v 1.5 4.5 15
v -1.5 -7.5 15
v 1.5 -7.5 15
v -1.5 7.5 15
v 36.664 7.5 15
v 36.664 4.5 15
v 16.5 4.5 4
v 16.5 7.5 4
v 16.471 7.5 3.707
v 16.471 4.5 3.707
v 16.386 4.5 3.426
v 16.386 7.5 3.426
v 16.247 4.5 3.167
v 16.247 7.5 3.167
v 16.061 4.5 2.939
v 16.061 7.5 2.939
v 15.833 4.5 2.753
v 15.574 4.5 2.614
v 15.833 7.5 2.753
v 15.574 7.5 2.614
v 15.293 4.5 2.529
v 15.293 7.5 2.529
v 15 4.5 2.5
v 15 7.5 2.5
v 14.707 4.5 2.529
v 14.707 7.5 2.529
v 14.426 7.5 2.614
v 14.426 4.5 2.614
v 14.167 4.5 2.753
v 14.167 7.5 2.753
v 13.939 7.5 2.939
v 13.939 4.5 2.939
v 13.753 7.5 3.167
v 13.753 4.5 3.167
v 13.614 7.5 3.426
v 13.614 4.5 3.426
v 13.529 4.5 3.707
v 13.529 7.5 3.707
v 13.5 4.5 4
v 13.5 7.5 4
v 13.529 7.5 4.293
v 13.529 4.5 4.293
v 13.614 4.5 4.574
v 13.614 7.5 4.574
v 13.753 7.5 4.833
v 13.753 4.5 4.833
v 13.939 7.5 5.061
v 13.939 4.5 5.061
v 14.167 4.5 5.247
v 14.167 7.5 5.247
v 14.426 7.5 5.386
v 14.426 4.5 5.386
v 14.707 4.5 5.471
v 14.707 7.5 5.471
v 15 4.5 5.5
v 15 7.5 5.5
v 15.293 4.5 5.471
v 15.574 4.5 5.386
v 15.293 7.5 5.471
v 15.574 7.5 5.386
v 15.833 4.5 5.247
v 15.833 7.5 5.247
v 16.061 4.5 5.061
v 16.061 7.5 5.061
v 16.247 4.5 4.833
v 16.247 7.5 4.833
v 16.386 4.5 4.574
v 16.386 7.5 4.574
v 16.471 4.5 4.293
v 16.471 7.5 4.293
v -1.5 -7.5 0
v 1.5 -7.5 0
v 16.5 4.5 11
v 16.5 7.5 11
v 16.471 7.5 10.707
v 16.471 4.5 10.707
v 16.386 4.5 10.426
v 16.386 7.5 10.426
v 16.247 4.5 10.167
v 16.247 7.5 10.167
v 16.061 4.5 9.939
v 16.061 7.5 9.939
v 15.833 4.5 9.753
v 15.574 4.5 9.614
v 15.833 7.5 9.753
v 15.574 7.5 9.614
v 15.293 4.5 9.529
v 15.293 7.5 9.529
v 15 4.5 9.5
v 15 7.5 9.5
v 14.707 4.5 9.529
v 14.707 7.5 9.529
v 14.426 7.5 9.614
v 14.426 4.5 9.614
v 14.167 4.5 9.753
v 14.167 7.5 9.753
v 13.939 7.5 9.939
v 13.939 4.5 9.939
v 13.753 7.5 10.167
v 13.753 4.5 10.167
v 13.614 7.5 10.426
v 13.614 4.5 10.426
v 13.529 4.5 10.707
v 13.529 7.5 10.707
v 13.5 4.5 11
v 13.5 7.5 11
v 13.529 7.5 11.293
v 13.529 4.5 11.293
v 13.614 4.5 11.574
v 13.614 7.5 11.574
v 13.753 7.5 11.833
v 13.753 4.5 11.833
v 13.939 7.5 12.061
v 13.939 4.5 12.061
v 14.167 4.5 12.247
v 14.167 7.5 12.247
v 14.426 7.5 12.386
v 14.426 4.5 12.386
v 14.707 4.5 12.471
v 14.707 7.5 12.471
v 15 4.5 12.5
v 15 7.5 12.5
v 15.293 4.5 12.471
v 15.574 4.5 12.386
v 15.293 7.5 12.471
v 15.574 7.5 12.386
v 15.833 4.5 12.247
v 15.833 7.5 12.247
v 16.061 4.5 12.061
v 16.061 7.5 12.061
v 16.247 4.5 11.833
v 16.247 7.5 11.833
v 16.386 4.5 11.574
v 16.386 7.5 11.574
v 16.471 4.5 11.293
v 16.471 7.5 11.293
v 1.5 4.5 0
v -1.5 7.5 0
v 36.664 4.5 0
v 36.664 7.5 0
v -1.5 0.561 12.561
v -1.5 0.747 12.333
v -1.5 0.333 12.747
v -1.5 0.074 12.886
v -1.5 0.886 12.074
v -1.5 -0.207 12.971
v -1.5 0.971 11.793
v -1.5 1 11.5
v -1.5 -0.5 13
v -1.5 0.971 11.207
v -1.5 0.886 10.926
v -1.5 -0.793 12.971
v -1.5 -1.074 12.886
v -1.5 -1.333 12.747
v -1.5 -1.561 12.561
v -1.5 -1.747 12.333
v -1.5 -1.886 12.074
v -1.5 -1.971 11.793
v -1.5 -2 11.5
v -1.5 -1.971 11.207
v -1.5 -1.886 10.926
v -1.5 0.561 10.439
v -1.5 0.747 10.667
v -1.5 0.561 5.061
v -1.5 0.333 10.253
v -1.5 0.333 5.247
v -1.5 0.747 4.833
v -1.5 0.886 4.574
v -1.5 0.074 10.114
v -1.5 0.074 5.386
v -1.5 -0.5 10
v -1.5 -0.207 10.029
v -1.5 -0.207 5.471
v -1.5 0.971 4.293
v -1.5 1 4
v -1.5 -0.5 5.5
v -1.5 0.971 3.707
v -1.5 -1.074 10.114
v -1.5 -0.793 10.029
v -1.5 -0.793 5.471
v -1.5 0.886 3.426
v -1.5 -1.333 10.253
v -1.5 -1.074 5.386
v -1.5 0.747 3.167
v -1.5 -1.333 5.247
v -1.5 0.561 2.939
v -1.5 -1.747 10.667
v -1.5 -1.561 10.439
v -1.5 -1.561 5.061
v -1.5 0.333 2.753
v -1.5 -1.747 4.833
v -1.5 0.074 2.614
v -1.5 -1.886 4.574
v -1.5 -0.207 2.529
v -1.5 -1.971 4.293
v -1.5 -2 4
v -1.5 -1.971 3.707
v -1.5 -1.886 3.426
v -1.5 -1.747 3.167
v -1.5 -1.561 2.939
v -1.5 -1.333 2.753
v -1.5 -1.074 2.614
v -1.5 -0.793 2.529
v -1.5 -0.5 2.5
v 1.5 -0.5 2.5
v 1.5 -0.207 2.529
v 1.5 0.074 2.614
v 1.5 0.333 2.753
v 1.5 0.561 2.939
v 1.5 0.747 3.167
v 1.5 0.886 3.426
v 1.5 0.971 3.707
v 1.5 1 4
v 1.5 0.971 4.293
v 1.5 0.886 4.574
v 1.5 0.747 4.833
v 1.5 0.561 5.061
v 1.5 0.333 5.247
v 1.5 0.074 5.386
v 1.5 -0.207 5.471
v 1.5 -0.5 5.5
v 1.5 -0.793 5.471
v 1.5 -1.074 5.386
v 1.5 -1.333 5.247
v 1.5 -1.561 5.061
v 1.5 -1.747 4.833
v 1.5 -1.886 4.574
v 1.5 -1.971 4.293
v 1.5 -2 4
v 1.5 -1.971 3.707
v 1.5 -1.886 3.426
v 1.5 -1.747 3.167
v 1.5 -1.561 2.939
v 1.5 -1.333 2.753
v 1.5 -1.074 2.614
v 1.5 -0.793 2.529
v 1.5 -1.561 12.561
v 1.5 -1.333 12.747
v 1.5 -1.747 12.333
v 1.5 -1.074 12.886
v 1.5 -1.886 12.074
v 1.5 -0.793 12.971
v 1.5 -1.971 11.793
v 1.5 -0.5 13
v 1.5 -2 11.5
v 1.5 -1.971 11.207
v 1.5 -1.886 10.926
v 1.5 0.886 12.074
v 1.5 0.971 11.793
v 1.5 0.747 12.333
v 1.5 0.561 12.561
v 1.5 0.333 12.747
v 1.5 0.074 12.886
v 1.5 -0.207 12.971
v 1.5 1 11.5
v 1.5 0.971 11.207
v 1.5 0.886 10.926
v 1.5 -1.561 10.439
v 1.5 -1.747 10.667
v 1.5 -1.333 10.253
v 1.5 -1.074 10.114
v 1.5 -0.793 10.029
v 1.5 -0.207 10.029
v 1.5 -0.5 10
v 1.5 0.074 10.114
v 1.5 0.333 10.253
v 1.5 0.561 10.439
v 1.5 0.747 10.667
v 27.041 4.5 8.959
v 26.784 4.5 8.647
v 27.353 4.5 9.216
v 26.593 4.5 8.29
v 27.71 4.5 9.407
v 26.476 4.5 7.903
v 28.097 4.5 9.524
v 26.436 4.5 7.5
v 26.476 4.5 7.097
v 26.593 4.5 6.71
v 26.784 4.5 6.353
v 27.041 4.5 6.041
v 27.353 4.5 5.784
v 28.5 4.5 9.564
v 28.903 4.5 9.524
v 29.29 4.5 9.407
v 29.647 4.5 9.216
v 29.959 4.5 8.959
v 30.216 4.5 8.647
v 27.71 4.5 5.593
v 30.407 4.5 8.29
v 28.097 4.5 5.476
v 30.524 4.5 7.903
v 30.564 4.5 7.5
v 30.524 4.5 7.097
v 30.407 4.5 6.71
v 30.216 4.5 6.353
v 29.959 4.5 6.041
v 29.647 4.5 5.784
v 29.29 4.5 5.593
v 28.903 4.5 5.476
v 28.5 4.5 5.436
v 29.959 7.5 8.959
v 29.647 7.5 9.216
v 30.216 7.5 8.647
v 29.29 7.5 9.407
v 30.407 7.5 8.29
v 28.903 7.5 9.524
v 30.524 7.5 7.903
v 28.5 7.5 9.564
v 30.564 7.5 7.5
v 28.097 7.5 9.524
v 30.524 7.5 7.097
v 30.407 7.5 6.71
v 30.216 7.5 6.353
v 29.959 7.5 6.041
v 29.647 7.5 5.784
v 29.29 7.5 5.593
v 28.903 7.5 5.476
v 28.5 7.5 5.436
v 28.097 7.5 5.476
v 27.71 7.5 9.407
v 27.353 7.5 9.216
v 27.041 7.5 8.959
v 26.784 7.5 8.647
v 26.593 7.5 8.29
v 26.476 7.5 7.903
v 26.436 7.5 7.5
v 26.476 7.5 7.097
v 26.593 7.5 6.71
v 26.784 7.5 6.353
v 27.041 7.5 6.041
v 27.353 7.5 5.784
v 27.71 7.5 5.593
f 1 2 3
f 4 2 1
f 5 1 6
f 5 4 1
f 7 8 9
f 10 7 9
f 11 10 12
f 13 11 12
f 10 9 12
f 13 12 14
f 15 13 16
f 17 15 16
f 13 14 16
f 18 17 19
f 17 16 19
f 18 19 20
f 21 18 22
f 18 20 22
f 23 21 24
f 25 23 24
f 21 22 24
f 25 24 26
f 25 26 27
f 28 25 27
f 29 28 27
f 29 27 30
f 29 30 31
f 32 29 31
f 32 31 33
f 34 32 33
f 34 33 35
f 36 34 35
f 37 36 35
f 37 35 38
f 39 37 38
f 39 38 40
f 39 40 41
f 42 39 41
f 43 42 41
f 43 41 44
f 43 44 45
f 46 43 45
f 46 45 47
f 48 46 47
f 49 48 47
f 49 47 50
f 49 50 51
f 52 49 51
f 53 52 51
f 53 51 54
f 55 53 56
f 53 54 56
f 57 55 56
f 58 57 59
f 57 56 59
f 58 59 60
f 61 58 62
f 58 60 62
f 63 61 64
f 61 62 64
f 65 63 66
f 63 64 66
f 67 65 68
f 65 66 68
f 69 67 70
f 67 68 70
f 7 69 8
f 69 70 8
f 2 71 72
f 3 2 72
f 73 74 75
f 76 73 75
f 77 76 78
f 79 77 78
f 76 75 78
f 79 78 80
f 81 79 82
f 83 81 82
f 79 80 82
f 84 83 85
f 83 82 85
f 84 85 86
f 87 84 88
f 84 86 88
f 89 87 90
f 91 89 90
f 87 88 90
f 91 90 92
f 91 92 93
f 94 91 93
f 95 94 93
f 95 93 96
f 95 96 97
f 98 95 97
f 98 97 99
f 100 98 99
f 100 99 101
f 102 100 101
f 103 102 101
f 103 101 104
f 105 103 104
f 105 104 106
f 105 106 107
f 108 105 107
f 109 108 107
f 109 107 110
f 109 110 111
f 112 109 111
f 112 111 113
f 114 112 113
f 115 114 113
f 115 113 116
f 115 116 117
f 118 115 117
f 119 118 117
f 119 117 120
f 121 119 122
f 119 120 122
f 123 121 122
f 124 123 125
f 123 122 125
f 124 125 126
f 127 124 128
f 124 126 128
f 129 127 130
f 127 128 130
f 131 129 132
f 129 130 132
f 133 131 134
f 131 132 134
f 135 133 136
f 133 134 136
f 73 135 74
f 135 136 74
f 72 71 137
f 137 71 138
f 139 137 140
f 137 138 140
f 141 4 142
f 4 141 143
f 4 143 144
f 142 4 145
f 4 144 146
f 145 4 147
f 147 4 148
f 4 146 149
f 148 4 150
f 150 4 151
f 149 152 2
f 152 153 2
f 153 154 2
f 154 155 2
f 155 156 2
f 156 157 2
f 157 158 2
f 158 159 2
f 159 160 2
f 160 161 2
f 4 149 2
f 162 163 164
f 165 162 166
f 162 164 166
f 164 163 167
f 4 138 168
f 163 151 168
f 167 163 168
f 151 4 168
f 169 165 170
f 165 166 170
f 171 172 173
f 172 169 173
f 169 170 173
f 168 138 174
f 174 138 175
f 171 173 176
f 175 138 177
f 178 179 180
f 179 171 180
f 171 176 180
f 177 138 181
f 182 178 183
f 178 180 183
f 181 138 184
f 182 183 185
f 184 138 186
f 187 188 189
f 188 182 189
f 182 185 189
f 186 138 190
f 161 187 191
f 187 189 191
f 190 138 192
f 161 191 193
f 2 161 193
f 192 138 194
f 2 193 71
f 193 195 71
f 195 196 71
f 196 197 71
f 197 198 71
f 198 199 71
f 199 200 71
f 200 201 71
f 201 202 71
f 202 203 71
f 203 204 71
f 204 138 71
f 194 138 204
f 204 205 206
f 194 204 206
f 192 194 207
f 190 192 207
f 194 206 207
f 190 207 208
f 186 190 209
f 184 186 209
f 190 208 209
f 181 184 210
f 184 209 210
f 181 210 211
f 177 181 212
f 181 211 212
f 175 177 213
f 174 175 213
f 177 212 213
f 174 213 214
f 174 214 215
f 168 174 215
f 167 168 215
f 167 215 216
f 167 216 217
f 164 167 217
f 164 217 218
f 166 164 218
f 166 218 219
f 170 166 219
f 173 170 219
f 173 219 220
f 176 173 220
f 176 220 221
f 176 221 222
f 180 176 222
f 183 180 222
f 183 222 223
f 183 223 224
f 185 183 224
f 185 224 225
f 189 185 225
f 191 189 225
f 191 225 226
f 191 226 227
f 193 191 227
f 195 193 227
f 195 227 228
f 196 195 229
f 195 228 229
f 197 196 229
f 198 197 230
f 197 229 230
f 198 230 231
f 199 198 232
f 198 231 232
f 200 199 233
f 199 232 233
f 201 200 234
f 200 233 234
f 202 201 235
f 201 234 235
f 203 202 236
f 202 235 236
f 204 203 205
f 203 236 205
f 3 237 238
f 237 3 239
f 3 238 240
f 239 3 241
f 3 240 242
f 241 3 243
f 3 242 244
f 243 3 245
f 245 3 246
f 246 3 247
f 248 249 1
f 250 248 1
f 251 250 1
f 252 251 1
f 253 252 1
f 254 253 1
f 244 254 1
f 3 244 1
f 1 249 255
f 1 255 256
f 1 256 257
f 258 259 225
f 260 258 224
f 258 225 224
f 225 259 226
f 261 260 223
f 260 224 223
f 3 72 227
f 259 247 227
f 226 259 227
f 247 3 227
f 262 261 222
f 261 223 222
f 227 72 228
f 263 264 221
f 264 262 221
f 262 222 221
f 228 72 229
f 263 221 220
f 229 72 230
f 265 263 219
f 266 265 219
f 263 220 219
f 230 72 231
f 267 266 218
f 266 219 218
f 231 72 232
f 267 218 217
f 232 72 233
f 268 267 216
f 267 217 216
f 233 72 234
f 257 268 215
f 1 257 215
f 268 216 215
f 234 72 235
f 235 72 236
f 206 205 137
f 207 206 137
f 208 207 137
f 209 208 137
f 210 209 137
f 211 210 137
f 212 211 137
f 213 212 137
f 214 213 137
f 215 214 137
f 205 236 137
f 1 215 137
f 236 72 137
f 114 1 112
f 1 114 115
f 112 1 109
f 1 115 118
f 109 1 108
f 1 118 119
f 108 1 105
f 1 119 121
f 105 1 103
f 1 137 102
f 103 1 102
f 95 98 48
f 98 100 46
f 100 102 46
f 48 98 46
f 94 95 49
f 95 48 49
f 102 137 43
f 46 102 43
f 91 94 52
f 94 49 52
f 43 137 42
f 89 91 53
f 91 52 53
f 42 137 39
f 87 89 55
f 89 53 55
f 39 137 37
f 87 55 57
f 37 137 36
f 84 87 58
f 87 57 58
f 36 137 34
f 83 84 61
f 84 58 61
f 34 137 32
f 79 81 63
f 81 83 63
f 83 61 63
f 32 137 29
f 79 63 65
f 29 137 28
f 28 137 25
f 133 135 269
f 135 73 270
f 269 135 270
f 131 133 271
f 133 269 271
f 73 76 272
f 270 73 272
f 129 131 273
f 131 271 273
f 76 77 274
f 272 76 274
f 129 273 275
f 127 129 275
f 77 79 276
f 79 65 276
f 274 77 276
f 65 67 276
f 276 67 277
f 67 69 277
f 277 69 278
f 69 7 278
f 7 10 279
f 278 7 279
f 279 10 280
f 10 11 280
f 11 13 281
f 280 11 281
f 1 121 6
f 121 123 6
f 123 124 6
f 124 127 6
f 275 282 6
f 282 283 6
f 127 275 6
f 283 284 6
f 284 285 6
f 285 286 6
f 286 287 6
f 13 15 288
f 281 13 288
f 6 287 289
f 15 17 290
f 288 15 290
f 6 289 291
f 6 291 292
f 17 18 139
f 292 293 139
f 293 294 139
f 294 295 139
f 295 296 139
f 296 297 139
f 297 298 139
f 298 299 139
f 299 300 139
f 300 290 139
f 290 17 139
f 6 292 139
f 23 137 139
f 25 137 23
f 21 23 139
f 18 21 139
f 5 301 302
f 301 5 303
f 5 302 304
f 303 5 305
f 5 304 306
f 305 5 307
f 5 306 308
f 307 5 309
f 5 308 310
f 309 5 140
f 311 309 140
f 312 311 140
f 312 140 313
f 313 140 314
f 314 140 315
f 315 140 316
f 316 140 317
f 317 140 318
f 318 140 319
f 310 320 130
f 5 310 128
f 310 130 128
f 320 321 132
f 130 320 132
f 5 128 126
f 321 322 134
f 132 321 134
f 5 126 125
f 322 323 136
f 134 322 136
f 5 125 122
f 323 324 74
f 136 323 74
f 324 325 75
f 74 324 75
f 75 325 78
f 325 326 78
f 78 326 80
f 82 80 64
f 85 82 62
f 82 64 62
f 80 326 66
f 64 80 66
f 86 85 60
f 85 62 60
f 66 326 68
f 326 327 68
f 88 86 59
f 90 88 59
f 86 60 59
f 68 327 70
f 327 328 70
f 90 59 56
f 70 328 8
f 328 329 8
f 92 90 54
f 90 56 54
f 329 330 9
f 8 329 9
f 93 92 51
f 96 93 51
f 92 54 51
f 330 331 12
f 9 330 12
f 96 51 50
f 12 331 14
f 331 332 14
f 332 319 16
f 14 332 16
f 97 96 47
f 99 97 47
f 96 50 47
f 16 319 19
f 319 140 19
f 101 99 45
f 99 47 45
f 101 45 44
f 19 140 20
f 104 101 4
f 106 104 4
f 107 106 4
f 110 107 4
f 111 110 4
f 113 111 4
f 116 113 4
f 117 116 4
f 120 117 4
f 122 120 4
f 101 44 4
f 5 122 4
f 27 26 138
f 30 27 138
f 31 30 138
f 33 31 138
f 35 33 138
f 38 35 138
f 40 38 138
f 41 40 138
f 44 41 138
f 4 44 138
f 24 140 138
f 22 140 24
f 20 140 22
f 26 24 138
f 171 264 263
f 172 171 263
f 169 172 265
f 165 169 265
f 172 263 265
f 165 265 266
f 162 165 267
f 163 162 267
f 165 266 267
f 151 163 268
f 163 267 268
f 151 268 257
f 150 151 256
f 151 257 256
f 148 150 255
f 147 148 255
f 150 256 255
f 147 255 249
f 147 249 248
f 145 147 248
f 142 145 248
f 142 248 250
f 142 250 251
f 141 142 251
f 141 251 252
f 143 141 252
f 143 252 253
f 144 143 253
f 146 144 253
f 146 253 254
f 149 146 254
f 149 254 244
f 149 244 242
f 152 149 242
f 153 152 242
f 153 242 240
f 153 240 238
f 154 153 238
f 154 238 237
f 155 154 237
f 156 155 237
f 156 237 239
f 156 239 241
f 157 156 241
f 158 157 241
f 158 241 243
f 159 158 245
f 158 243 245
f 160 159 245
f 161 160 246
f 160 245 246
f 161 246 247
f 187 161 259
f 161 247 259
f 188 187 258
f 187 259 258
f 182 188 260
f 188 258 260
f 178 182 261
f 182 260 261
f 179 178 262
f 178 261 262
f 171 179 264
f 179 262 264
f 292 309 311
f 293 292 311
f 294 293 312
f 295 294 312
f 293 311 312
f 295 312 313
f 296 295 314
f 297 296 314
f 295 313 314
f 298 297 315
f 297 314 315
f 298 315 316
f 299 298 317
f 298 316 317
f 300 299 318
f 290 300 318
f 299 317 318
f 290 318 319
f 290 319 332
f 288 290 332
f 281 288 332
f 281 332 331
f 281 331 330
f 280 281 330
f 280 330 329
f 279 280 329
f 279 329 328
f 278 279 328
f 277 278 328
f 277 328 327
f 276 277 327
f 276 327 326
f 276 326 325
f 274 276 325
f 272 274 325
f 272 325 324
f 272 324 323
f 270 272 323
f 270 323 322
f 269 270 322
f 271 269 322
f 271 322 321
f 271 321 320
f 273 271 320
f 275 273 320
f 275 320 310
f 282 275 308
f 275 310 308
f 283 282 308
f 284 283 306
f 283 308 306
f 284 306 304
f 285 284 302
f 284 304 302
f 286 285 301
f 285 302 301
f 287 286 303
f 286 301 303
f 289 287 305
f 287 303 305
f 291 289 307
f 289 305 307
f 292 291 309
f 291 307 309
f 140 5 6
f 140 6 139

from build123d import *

# Parameters (mm, degrees)
CROQUIS1_W              = 3
CROQUIS1_H              = 12
CROQUIS1_H_2            = 3
CROQUIS1_W_2            = 47
SALIENTE_EXTRUIR1_DEPTH = 15
CROQUIS2_R              = 1.5
CORTAR_EXTRUIR1_DEPTH   = 30
CROQUIS4_R              = 2.063665481
CORTAR_EXTRUIR3_DEPTH   = 10
CROQUIS5_W              = 11.835753584
CROQUIS5_H              = 15
CORTAR_EXTRUIR4_DEPTH   = 30
CROQUIS6_R              = 1.5
CORTAR_EXTRUIR5_DEPTH   = 10


with BuildPart() as part:
    # Croquis1 → Saliente-Extruir1 (new body)
    with BuildSketch(Plane.XY):
        with Locations((0, -1.5)):
            Rectangle(CROQUIS1_W, CROQUIS1_H)
        with Locations((0, 6)):
            Rectangle(CROQUIS1_W, CROQUIS1_H_2)
        with Locations((25, 6)):
            Rectangle(CROQUIS1_W_2, CROQUIS1_H_2)
    extrude(amount=SALIENTE_EXTRUIR1_DEPTH)

    # Croquis2 → Cortar-Extruir1 (cut)
    with BuildSketch(Plane(origin=(1.5, 0, 0), x_dir=(0, 0, -1), z_dir=(1, 0, 0))):
        with Locations((-11.5, -0.5)):
            Circle(CROQUIS2_R)
        with Locations((-4, -0.5)):
            Circle(CROQUIS2_R)
    extrude(amount=-CORTAR_EXTRUIR1_DEPTH, mode=Mode.SUBTRACT)

    # Croquis4 → Cortar-Extruir3 (cut)
    with BuildSketch(Plane(origin=(0, 7.5, 0), x_dir=(1, 0, 0), z_dir=(0, 1, 0))):
        with Locations((28.5, -7.5)):
            Circle(CROQUIS4_R)
    extrude(amount=-CORTAR_EXTRUIR3_DEPTH, mode=Mode.SUBTRACT)

    # Croquis5 → Cortar-Extruir4 (cut)
    with BuildSketch(Plane(origin=(0, 7.5, 0), x_dir=(1, 0, 0), z_dir=(0, 1, 0))):
        with Locations((42.582123208, -7.5)):
            Rectangle(CROQUIS5_W, CROQUIS5_H)
    extrude(amount=-CORTAR_EXTRUIR4_DEPTH, mode=Mode.SUBTRACT)

    # Croquis6 → Cortar-Extruir5 (cut)
    with BuildSketch(Plane(origin=(0, 7.5, 0), x_dir=(1, 0, 0), z_dir=(0, 1, 0))):
        with Locations((15, -4)):
            Circle(CROQUIS6_R)
        with Locations((15, -11)):
            Circle(CROQUIS6_R)
    extrude(amount=-CORTAR_EXTRUIR5_DEPTH, mode=Mode.SUBTRACT)


solid = part.part
